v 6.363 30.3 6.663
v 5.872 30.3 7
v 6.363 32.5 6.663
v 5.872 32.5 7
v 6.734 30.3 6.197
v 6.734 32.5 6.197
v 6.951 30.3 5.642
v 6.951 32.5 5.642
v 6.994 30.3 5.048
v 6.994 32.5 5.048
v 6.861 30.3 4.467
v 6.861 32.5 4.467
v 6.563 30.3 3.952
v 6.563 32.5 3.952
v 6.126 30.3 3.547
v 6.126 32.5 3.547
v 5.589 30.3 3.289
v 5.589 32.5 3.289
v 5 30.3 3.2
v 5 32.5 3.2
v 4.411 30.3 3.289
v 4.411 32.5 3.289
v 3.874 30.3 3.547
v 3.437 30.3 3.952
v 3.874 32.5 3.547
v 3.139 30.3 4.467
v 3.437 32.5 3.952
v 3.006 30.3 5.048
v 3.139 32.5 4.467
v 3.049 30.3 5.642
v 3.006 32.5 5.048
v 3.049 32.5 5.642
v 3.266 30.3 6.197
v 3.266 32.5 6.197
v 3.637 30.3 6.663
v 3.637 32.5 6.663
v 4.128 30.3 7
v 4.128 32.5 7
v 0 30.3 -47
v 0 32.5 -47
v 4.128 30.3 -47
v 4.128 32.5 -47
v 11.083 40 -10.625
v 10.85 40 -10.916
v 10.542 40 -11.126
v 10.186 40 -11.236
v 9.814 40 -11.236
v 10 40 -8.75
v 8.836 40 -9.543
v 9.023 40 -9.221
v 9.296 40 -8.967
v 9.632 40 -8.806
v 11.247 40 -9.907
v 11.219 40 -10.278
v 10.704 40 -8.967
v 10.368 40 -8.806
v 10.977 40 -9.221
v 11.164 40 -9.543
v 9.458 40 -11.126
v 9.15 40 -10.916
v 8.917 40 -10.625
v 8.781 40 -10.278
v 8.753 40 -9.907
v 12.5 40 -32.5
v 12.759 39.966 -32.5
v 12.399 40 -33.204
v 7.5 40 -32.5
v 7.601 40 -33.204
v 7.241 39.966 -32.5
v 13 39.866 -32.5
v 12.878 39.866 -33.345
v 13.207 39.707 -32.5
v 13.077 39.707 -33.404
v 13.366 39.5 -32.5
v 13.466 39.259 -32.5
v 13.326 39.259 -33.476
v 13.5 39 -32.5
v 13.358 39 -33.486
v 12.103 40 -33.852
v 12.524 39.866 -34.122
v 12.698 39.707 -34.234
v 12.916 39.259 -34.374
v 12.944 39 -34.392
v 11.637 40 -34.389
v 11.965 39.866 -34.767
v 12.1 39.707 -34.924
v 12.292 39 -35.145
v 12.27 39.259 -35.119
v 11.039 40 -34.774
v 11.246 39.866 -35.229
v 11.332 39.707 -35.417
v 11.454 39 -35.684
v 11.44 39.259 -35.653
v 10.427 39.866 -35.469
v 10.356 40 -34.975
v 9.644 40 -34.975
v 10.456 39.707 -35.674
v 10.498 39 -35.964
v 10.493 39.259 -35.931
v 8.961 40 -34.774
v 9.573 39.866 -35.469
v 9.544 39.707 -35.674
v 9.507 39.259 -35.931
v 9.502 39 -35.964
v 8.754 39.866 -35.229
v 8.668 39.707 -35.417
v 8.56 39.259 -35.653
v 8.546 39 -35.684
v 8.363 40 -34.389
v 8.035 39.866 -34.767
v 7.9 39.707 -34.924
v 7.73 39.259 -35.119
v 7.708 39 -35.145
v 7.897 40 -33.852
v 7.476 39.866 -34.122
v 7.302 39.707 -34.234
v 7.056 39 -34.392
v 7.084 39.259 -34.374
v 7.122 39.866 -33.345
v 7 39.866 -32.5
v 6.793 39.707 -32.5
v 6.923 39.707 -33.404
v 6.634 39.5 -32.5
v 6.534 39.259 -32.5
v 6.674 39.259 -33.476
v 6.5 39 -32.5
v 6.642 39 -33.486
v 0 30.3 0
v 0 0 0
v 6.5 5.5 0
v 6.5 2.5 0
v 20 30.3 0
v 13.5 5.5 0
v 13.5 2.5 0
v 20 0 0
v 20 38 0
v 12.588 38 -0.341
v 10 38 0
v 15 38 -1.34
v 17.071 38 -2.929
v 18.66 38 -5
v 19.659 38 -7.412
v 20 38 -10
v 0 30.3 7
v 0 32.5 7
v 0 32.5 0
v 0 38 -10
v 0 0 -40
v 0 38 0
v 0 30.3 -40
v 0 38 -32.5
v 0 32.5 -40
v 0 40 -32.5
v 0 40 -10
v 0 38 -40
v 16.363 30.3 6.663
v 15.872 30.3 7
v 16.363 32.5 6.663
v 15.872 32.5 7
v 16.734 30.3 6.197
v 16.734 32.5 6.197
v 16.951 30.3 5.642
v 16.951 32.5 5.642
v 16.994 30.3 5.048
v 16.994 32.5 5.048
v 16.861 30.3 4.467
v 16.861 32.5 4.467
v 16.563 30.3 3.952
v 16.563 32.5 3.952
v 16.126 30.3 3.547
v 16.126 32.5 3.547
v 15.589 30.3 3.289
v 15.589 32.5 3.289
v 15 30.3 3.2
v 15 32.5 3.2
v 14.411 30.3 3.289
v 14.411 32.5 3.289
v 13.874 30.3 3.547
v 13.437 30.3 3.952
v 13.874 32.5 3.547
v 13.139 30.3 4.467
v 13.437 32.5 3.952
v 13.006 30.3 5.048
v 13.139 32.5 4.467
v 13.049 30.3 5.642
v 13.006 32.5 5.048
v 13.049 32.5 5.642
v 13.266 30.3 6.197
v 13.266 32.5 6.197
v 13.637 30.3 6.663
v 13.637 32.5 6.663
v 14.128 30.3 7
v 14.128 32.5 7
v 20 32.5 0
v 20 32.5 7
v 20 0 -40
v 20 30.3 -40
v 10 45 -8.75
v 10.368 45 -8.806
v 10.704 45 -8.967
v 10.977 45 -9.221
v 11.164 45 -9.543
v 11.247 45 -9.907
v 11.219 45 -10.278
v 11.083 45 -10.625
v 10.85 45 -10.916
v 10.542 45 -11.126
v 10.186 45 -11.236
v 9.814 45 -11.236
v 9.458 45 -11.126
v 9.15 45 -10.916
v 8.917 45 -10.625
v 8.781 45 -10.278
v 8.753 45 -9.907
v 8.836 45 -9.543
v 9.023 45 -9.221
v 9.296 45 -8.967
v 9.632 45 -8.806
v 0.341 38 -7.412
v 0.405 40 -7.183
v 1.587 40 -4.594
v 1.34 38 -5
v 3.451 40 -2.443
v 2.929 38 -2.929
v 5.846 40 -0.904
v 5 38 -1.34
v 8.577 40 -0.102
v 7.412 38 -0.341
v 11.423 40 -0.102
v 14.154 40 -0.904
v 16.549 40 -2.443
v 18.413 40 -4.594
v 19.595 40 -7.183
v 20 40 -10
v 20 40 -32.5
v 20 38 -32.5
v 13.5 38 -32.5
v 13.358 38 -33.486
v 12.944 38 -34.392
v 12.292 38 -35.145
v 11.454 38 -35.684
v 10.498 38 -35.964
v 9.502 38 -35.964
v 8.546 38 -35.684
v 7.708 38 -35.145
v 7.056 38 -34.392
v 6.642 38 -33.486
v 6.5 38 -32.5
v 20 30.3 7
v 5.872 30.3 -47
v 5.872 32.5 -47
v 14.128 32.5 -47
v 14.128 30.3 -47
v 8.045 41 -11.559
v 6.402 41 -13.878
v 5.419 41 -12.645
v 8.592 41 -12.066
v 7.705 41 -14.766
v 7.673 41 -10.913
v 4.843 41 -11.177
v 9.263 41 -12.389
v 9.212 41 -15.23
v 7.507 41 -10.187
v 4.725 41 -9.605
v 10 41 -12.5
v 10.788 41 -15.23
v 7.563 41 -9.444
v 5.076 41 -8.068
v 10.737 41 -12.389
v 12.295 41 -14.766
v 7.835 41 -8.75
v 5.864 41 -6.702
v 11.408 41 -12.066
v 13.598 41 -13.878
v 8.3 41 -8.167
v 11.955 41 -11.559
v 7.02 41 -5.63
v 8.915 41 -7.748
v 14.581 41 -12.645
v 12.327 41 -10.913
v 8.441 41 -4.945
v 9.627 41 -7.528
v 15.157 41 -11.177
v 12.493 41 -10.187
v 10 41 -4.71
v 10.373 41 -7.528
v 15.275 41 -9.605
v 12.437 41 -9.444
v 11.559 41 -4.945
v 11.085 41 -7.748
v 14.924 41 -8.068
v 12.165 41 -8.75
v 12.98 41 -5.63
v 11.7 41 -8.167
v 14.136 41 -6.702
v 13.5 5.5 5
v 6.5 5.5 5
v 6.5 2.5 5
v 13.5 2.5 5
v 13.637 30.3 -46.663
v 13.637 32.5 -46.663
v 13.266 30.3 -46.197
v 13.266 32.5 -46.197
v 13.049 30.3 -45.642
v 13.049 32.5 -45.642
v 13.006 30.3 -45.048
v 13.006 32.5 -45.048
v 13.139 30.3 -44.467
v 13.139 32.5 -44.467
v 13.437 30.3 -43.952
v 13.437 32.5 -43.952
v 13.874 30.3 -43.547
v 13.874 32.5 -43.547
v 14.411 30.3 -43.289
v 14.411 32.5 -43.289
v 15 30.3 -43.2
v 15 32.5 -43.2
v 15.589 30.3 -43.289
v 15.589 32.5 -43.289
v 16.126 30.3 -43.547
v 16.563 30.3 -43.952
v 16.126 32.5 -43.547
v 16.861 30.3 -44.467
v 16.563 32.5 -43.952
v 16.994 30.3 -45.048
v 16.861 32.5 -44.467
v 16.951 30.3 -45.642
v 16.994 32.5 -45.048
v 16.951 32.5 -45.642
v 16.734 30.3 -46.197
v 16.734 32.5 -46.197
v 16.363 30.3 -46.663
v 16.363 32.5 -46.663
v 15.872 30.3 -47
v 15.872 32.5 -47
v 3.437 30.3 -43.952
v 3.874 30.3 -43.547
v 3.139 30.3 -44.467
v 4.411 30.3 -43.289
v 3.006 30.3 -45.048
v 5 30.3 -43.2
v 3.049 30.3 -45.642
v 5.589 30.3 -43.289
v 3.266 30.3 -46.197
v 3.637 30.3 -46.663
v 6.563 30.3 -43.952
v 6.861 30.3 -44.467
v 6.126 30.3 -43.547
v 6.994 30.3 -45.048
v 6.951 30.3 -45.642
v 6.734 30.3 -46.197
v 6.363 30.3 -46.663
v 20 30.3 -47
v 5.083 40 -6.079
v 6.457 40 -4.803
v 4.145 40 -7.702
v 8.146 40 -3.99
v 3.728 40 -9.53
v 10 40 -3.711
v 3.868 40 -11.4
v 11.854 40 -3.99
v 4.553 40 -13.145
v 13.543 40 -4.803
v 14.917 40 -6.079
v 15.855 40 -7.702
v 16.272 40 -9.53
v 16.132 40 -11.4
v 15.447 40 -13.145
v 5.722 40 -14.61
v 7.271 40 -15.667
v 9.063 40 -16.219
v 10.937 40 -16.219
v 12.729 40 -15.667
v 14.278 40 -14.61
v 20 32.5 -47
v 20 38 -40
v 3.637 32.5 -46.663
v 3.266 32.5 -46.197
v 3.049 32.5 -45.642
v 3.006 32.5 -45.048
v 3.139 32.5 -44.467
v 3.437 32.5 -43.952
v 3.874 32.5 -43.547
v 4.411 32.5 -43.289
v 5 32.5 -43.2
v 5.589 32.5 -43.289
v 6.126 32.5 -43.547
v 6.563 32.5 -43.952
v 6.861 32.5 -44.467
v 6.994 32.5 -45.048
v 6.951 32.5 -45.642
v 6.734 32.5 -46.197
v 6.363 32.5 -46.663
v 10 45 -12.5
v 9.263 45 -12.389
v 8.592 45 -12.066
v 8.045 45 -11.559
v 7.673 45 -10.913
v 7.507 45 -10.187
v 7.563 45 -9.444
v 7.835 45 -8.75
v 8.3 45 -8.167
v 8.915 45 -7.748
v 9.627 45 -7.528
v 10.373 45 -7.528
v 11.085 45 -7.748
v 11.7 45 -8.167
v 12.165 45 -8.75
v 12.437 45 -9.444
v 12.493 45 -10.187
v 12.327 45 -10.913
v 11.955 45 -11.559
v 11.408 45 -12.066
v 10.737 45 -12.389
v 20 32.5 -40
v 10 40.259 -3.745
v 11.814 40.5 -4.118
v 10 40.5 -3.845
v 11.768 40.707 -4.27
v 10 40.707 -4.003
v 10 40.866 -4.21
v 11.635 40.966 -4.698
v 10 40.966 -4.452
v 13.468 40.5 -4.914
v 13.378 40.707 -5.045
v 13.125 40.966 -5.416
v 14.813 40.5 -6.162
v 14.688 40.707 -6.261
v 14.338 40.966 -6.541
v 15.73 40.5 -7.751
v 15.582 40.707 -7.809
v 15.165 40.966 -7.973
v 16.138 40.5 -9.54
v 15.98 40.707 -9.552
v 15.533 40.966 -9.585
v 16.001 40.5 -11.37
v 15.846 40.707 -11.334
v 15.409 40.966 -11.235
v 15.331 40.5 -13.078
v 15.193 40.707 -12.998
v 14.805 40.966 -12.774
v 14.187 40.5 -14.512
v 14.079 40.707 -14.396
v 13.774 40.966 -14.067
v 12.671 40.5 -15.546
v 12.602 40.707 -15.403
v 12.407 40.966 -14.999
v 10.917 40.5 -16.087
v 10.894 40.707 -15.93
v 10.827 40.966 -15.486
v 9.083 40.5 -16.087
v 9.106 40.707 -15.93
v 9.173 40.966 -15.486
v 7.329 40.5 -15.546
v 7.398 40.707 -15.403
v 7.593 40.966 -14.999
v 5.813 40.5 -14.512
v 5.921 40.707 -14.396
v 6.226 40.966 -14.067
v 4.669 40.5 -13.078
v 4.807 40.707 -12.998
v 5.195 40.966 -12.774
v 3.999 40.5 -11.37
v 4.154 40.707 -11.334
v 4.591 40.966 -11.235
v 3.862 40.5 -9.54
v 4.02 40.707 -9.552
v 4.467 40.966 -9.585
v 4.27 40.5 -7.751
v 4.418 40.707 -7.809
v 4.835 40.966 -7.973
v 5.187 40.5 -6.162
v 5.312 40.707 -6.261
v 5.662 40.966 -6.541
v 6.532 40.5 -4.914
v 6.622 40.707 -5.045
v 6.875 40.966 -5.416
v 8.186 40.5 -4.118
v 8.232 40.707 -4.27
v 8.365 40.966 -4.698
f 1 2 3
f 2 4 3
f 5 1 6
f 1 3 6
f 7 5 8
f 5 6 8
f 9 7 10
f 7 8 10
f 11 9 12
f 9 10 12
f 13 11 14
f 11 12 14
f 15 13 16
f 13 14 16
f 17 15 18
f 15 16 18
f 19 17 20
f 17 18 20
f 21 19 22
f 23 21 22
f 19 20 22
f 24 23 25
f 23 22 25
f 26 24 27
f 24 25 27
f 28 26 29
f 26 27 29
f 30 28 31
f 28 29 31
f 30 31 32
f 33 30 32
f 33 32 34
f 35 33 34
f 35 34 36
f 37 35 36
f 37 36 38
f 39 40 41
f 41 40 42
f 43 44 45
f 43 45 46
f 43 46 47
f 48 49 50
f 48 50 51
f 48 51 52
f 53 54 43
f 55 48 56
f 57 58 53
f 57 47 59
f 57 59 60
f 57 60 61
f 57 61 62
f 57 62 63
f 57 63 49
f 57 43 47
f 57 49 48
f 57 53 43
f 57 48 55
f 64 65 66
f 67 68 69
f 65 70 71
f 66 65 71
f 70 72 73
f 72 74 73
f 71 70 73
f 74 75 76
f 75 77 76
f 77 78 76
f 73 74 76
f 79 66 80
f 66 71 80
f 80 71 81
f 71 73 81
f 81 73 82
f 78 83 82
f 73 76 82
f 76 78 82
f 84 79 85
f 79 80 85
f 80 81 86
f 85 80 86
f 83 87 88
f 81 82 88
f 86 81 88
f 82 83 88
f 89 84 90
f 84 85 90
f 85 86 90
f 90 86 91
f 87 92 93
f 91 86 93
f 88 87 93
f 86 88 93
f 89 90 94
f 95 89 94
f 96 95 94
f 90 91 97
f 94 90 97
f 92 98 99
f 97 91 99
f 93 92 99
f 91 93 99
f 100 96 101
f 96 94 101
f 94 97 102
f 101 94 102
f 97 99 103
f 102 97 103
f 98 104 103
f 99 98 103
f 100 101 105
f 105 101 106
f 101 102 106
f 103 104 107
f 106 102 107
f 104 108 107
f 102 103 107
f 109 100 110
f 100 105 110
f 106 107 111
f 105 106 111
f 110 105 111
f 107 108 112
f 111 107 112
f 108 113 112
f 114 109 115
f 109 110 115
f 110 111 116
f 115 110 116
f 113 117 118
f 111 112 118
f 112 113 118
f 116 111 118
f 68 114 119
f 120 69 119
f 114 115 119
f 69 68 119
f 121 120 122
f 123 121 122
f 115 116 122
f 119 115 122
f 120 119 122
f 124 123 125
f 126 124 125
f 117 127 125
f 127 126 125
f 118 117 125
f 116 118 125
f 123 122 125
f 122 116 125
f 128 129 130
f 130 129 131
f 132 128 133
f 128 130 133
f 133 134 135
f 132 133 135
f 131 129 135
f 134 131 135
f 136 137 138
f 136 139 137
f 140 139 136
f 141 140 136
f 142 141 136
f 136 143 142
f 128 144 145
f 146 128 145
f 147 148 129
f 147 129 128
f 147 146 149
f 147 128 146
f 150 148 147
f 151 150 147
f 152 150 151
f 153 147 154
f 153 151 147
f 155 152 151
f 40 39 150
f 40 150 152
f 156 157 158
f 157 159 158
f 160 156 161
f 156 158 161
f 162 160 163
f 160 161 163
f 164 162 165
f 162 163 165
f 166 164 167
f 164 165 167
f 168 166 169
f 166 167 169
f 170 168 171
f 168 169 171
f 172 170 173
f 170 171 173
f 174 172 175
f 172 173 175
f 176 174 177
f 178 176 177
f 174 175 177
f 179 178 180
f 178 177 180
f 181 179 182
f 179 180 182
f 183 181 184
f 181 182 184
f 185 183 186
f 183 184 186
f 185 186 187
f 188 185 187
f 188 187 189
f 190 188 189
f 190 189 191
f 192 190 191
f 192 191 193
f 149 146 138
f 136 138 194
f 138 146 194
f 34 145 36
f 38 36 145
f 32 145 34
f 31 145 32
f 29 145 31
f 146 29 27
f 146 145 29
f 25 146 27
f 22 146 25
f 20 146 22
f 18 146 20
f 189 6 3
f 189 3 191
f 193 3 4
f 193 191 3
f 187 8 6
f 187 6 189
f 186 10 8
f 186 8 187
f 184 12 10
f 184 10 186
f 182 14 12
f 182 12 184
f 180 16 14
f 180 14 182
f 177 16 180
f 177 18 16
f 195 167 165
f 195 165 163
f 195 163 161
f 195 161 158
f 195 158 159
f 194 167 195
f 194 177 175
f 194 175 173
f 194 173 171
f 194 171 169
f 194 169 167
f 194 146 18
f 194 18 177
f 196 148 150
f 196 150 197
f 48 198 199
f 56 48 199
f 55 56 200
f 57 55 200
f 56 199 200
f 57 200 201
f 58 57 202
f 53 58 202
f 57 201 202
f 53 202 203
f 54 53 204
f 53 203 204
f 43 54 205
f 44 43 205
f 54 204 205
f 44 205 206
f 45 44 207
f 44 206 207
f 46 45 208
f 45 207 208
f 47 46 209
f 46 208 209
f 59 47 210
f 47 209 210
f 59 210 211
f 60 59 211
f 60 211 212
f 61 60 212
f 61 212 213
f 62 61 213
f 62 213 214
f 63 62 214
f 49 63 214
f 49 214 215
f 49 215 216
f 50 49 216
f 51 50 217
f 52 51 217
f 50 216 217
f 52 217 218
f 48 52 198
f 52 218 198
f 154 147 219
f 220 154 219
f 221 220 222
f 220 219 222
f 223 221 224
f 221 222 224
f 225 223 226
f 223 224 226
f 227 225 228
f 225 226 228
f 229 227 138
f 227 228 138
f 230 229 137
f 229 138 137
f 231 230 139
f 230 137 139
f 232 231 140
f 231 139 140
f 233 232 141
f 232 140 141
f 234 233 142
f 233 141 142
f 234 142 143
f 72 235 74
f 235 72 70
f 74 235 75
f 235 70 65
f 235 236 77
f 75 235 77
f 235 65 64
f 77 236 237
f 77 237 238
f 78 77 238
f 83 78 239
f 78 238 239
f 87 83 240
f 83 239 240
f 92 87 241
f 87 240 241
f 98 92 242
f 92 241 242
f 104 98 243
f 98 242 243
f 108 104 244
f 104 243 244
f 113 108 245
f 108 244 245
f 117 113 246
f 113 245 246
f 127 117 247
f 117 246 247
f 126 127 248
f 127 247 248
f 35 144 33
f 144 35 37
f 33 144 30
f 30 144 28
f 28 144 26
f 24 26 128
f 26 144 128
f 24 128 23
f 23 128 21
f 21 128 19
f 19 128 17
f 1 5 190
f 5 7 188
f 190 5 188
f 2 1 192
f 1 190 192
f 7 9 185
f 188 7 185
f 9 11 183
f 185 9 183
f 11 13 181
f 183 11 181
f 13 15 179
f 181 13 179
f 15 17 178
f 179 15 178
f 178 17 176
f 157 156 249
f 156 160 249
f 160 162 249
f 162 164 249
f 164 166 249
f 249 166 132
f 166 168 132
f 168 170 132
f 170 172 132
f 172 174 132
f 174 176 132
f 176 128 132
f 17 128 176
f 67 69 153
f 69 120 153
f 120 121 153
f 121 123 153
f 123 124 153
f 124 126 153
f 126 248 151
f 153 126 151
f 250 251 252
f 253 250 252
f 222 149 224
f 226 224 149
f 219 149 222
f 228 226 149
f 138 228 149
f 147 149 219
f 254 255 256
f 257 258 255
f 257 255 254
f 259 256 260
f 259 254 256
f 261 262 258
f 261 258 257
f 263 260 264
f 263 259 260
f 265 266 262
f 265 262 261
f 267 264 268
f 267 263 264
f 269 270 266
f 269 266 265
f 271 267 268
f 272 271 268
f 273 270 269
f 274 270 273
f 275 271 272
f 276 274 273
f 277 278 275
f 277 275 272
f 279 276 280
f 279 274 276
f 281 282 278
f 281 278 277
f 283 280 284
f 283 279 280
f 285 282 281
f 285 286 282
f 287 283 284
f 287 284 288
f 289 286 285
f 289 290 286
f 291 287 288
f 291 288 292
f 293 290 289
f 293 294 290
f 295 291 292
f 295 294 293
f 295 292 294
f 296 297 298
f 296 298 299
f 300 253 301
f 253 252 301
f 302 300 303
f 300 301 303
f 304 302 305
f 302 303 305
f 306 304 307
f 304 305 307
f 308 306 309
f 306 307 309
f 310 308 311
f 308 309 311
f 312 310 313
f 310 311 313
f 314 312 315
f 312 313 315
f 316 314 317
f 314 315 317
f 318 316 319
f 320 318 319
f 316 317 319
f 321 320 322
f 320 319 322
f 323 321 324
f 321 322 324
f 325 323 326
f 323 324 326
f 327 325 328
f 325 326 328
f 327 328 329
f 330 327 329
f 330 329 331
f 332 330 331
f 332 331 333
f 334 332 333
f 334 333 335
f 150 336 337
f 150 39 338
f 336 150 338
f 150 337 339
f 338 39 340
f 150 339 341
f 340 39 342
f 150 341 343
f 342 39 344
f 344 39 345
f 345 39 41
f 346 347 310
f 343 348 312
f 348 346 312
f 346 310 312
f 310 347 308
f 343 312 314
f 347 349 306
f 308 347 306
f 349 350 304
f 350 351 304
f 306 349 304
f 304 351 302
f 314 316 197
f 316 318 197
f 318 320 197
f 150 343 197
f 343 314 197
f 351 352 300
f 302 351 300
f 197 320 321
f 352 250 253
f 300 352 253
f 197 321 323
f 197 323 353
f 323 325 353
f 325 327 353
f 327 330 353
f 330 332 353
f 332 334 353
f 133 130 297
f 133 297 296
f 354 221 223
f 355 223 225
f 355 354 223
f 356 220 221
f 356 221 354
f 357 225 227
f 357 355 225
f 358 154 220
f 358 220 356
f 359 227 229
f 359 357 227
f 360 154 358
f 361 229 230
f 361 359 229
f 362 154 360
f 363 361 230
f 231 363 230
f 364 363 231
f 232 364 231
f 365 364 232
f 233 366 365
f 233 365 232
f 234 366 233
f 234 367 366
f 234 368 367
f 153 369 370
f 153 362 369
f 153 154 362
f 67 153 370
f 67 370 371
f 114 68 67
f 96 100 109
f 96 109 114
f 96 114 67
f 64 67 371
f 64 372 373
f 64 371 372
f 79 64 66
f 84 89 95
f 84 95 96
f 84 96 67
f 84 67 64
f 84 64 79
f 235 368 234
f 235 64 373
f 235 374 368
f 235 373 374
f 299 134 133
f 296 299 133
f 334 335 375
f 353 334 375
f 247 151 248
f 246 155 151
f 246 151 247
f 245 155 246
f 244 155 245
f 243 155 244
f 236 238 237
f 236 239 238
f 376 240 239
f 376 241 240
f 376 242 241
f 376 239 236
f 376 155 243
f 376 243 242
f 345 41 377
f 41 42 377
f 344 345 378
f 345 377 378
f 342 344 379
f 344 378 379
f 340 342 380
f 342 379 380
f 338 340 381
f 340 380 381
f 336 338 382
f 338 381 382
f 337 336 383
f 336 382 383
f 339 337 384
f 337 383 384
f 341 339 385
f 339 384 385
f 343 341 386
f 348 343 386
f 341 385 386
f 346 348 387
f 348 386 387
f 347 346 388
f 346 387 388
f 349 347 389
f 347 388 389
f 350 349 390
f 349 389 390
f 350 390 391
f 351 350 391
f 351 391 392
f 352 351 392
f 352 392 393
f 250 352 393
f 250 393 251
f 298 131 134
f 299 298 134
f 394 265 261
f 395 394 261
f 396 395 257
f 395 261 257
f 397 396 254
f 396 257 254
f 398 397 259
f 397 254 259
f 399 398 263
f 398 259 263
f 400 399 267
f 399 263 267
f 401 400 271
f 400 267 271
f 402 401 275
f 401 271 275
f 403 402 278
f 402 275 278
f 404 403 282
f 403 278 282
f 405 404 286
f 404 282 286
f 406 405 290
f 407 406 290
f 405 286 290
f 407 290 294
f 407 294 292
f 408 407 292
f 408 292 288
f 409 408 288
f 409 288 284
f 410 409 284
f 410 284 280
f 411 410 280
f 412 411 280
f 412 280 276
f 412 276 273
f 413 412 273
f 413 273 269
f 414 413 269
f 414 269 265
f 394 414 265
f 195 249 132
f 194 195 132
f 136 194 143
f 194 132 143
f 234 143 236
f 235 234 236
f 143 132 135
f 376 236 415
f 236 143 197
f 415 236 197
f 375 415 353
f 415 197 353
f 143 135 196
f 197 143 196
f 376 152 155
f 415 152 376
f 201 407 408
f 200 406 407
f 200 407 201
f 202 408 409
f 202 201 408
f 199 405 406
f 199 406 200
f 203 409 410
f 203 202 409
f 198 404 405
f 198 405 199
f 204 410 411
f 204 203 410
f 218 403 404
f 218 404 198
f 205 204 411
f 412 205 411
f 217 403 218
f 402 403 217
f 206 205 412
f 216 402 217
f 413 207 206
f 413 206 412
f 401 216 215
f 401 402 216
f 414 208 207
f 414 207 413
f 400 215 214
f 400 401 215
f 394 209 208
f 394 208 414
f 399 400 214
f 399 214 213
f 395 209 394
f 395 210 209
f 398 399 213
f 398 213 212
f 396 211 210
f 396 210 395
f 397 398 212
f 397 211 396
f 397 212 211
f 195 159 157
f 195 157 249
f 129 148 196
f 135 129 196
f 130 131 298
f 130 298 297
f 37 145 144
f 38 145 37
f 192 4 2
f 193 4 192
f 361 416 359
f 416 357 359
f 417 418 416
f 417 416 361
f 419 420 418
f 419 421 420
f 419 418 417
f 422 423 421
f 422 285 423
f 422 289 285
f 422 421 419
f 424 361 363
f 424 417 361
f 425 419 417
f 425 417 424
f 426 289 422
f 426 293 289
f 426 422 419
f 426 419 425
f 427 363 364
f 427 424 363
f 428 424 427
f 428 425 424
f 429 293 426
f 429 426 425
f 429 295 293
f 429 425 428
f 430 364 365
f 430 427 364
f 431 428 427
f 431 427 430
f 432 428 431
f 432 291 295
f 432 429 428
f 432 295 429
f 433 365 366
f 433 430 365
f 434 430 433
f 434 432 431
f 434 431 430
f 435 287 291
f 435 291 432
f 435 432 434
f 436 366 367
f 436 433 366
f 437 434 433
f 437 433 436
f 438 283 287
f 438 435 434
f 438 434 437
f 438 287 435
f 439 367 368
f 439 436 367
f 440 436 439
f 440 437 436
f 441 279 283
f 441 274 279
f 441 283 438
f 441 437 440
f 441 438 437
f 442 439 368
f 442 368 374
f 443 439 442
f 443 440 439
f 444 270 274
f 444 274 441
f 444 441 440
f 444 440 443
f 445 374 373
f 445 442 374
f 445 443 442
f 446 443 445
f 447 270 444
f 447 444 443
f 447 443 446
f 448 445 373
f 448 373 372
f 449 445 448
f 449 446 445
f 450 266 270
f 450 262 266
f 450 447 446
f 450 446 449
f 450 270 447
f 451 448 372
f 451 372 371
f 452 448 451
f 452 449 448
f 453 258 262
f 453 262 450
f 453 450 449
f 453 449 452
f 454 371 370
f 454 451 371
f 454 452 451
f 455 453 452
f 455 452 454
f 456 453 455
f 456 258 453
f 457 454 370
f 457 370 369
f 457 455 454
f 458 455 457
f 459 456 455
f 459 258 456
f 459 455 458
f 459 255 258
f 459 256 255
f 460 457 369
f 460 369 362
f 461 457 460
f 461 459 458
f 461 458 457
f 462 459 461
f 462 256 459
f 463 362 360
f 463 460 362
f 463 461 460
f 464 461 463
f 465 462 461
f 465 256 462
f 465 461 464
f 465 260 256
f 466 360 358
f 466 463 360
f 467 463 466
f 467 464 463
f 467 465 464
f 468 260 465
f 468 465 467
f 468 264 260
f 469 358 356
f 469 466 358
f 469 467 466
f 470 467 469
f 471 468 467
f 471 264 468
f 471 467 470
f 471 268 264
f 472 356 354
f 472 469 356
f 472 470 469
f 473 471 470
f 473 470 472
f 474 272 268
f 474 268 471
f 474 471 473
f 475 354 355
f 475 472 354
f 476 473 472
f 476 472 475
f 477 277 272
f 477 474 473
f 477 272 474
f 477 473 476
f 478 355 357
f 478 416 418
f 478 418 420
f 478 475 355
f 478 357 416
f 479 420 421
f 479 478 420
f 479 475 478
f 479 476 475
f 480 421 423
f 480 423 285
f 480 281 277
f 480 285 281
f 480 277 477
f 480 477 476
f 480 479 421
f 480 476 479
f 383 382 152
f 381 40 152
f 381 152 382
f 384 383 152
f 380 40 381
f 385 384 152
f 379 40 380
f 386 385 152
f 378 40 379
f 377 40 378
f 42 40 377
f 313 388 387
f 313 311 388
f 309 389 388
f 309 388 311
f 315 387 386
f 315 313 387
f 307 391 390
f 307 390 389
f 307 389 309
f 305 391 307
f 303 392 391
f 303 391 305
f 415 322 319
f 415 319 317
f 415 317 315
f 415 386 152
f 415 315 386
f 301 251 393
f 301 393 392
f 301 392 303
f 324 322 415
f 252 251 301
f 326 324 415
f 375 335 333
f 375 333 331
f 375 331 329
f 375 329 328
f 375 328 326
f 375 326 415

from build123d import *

# Parameters (mm, degrees)
SKETCH1_W                = 20
SKETCH1_H                = 40
BOSS_EXTRUDE1_DEPTH      = 38
SKETCH2_W                = 7
SKETCH2_H                = 3
BOSS_EXTRUDE2_DEPTH      = 5
SKETCH3_R                = 2.5
BOSS_EXTRUDE3_DEPTH      = 7
BOSS_EXTRUDE4_DEPTH      = 7
BOSS_EXTRUDE4_DEPTH_BACK = 47
SKETCH4_W                = 20
SKETCH4_H                = 2.2
SKETCH5_R                = 2
CUT_EXTRUDE1_DEPTH       = 7
BOSS_EXTRUDE5_DEPTH      = 2
SKETCH7_R                = 6.289454611
BOSS_EXTRUDE6_DEPTH      = 1
FILLET1_R                = 1
FILLET2_R                = 1
SKETCH8_R                = 1.25
CUT_EXTRUDE2_DEPTH       = 5


with BuildPart() as part:
    # Sketch1 → Boss-Extrude1 (new body)
    with BuildSketch(Plane(origin=(0, 0, 0), x_dir=(1, 0, 0), z_dir=(0, 1, 0))):
        with Locations((10, 20)):
            Rectangle(SKETCH1_W, SKETCH1_H)
    extrude(amount=BOSS_EXTRUDE1_DEPTH)

    # Sketch2 → Boss-Extrude2 (add)
    with BuildSketch(Plane.XY):
        with Locations((10, 4)):
            Rectangle(SKETCH2_W, SKETCH2_H)
    extrude(amount=BOSS_EXTRUDE2_DEPTH)

    # Sketch3 → Boss-Extrude3 (add)
    with BuildSketch(Plane(origin=(0, 38, 0), x_dir=(1, 0, 0), z_dir=(0, 1, 0))):
        with Locations(Location((10, 10, 0), (0, 0, 90))):
            Circle(SKETCH3_R)
    extrude(amount=BOSS_EXTRUDE3_DEPTH)

    # Sketch4 → Boss-Extrude4 (add, two sides: drawn at the far end of the back side and taken through both)
    with BuildSketch(Plane.XY.offset(-BOSS_EXTRUDE4_DEPTH_BACK)):
        with Locations((10, 31.4)):
            Rectangle(SKETCH4_W, SKETCH4_H)
    extrude(amount=BOSS_EXTRUDE4_DEPTH + BOSS_EXTRUDE4_DEPTH_BACK)

    # Sketch5 → Cut-Extrude1 (cut)
    with BuildSketch(Plane(origin=(0, 32.5, 0), x_dir=(1, 0, 0), z_dir=(0, 1, 0))):
        with Locations((15, 45.2)):
            Circle(SKETCH5_R)
        with Locations((5, 45.2)):
            Circle(SKETCH5_R)
        with Locations((15, -5.2)):
            Circle(SKETCH5_R)
        with Locations((5, -5.2)):
            Circle(SKETCH5_R)
    extrude(amount=-CUT_EXTRUDE1_DEPTH, mode=Mode.SUBTRACT)

    # Sketch6 → Boss-Extrude5 (add)
    with BuildSketch(Plane(origin=(0, 38, 0), x_dir=(1, 0, 0), z_dir=(0, 1, 0))):
        with BuildLine():
            Line((20, 32.5), (13.5, 32.5))
            ThreePointArc((13.5, 32.5), (10, 36), (6.5, 32.5))
            Line((6.5, 32.5), (0, 32.5))
            Line((0, 32.5), (0, 10))
            ThreePointArc((0, 10), (10, 0), (20, 10))
            Line((20, 10), (20, 32.5))
        make_face()
    extrude(amount=BOSS_EXTRUDE5_DEPTH)

    # Sketch7 → Boss-Extrude6 (add)
    with BuildSketch(Plane(origin=(0, 40, 0), x_dir=(1, 0, 0), z_dir=(0, 1, 0))):
        with Locations(Location((10, 10, 0), (0, 0, 270))):
            Circle(SKETCH7_R)
    extrude(amount=BOSS_EXTRUDE6_DEPTH)

    # Fillet1
    fillet1_edges = [part.edges().sort_by_distance(p)[0] for p in [
        (10, 41, -16.289454611),
    ]]
    fillet(fillet1_edges, radius=FILLET1_R - 0.0001)  # a hair under: the kernel refuses the full size

    # Fillet2
    fillet2_edges = [part.edges().sort_by_distance(p)[0] for p in [
        (10, 40, -36),
    ]]
    fillet(fillet2_edges, radius=FILLET2_R)

    # Sketch8 → Cut-Extrude2 (cut)
    with BuildSketch(Plane(origin=(0, 45, 0), x_dir=(1, 0, 0), z_dir=(0, 1, 0))):
        with Locations(Location((10, 10, 0), (0, 0, 270))):
            Circle(SKETCH8_R)
    extrude(amount=-CUT_EXTRUDE2_DEPTH, mode=Mode.SUBTRACT)


solid = part.part
